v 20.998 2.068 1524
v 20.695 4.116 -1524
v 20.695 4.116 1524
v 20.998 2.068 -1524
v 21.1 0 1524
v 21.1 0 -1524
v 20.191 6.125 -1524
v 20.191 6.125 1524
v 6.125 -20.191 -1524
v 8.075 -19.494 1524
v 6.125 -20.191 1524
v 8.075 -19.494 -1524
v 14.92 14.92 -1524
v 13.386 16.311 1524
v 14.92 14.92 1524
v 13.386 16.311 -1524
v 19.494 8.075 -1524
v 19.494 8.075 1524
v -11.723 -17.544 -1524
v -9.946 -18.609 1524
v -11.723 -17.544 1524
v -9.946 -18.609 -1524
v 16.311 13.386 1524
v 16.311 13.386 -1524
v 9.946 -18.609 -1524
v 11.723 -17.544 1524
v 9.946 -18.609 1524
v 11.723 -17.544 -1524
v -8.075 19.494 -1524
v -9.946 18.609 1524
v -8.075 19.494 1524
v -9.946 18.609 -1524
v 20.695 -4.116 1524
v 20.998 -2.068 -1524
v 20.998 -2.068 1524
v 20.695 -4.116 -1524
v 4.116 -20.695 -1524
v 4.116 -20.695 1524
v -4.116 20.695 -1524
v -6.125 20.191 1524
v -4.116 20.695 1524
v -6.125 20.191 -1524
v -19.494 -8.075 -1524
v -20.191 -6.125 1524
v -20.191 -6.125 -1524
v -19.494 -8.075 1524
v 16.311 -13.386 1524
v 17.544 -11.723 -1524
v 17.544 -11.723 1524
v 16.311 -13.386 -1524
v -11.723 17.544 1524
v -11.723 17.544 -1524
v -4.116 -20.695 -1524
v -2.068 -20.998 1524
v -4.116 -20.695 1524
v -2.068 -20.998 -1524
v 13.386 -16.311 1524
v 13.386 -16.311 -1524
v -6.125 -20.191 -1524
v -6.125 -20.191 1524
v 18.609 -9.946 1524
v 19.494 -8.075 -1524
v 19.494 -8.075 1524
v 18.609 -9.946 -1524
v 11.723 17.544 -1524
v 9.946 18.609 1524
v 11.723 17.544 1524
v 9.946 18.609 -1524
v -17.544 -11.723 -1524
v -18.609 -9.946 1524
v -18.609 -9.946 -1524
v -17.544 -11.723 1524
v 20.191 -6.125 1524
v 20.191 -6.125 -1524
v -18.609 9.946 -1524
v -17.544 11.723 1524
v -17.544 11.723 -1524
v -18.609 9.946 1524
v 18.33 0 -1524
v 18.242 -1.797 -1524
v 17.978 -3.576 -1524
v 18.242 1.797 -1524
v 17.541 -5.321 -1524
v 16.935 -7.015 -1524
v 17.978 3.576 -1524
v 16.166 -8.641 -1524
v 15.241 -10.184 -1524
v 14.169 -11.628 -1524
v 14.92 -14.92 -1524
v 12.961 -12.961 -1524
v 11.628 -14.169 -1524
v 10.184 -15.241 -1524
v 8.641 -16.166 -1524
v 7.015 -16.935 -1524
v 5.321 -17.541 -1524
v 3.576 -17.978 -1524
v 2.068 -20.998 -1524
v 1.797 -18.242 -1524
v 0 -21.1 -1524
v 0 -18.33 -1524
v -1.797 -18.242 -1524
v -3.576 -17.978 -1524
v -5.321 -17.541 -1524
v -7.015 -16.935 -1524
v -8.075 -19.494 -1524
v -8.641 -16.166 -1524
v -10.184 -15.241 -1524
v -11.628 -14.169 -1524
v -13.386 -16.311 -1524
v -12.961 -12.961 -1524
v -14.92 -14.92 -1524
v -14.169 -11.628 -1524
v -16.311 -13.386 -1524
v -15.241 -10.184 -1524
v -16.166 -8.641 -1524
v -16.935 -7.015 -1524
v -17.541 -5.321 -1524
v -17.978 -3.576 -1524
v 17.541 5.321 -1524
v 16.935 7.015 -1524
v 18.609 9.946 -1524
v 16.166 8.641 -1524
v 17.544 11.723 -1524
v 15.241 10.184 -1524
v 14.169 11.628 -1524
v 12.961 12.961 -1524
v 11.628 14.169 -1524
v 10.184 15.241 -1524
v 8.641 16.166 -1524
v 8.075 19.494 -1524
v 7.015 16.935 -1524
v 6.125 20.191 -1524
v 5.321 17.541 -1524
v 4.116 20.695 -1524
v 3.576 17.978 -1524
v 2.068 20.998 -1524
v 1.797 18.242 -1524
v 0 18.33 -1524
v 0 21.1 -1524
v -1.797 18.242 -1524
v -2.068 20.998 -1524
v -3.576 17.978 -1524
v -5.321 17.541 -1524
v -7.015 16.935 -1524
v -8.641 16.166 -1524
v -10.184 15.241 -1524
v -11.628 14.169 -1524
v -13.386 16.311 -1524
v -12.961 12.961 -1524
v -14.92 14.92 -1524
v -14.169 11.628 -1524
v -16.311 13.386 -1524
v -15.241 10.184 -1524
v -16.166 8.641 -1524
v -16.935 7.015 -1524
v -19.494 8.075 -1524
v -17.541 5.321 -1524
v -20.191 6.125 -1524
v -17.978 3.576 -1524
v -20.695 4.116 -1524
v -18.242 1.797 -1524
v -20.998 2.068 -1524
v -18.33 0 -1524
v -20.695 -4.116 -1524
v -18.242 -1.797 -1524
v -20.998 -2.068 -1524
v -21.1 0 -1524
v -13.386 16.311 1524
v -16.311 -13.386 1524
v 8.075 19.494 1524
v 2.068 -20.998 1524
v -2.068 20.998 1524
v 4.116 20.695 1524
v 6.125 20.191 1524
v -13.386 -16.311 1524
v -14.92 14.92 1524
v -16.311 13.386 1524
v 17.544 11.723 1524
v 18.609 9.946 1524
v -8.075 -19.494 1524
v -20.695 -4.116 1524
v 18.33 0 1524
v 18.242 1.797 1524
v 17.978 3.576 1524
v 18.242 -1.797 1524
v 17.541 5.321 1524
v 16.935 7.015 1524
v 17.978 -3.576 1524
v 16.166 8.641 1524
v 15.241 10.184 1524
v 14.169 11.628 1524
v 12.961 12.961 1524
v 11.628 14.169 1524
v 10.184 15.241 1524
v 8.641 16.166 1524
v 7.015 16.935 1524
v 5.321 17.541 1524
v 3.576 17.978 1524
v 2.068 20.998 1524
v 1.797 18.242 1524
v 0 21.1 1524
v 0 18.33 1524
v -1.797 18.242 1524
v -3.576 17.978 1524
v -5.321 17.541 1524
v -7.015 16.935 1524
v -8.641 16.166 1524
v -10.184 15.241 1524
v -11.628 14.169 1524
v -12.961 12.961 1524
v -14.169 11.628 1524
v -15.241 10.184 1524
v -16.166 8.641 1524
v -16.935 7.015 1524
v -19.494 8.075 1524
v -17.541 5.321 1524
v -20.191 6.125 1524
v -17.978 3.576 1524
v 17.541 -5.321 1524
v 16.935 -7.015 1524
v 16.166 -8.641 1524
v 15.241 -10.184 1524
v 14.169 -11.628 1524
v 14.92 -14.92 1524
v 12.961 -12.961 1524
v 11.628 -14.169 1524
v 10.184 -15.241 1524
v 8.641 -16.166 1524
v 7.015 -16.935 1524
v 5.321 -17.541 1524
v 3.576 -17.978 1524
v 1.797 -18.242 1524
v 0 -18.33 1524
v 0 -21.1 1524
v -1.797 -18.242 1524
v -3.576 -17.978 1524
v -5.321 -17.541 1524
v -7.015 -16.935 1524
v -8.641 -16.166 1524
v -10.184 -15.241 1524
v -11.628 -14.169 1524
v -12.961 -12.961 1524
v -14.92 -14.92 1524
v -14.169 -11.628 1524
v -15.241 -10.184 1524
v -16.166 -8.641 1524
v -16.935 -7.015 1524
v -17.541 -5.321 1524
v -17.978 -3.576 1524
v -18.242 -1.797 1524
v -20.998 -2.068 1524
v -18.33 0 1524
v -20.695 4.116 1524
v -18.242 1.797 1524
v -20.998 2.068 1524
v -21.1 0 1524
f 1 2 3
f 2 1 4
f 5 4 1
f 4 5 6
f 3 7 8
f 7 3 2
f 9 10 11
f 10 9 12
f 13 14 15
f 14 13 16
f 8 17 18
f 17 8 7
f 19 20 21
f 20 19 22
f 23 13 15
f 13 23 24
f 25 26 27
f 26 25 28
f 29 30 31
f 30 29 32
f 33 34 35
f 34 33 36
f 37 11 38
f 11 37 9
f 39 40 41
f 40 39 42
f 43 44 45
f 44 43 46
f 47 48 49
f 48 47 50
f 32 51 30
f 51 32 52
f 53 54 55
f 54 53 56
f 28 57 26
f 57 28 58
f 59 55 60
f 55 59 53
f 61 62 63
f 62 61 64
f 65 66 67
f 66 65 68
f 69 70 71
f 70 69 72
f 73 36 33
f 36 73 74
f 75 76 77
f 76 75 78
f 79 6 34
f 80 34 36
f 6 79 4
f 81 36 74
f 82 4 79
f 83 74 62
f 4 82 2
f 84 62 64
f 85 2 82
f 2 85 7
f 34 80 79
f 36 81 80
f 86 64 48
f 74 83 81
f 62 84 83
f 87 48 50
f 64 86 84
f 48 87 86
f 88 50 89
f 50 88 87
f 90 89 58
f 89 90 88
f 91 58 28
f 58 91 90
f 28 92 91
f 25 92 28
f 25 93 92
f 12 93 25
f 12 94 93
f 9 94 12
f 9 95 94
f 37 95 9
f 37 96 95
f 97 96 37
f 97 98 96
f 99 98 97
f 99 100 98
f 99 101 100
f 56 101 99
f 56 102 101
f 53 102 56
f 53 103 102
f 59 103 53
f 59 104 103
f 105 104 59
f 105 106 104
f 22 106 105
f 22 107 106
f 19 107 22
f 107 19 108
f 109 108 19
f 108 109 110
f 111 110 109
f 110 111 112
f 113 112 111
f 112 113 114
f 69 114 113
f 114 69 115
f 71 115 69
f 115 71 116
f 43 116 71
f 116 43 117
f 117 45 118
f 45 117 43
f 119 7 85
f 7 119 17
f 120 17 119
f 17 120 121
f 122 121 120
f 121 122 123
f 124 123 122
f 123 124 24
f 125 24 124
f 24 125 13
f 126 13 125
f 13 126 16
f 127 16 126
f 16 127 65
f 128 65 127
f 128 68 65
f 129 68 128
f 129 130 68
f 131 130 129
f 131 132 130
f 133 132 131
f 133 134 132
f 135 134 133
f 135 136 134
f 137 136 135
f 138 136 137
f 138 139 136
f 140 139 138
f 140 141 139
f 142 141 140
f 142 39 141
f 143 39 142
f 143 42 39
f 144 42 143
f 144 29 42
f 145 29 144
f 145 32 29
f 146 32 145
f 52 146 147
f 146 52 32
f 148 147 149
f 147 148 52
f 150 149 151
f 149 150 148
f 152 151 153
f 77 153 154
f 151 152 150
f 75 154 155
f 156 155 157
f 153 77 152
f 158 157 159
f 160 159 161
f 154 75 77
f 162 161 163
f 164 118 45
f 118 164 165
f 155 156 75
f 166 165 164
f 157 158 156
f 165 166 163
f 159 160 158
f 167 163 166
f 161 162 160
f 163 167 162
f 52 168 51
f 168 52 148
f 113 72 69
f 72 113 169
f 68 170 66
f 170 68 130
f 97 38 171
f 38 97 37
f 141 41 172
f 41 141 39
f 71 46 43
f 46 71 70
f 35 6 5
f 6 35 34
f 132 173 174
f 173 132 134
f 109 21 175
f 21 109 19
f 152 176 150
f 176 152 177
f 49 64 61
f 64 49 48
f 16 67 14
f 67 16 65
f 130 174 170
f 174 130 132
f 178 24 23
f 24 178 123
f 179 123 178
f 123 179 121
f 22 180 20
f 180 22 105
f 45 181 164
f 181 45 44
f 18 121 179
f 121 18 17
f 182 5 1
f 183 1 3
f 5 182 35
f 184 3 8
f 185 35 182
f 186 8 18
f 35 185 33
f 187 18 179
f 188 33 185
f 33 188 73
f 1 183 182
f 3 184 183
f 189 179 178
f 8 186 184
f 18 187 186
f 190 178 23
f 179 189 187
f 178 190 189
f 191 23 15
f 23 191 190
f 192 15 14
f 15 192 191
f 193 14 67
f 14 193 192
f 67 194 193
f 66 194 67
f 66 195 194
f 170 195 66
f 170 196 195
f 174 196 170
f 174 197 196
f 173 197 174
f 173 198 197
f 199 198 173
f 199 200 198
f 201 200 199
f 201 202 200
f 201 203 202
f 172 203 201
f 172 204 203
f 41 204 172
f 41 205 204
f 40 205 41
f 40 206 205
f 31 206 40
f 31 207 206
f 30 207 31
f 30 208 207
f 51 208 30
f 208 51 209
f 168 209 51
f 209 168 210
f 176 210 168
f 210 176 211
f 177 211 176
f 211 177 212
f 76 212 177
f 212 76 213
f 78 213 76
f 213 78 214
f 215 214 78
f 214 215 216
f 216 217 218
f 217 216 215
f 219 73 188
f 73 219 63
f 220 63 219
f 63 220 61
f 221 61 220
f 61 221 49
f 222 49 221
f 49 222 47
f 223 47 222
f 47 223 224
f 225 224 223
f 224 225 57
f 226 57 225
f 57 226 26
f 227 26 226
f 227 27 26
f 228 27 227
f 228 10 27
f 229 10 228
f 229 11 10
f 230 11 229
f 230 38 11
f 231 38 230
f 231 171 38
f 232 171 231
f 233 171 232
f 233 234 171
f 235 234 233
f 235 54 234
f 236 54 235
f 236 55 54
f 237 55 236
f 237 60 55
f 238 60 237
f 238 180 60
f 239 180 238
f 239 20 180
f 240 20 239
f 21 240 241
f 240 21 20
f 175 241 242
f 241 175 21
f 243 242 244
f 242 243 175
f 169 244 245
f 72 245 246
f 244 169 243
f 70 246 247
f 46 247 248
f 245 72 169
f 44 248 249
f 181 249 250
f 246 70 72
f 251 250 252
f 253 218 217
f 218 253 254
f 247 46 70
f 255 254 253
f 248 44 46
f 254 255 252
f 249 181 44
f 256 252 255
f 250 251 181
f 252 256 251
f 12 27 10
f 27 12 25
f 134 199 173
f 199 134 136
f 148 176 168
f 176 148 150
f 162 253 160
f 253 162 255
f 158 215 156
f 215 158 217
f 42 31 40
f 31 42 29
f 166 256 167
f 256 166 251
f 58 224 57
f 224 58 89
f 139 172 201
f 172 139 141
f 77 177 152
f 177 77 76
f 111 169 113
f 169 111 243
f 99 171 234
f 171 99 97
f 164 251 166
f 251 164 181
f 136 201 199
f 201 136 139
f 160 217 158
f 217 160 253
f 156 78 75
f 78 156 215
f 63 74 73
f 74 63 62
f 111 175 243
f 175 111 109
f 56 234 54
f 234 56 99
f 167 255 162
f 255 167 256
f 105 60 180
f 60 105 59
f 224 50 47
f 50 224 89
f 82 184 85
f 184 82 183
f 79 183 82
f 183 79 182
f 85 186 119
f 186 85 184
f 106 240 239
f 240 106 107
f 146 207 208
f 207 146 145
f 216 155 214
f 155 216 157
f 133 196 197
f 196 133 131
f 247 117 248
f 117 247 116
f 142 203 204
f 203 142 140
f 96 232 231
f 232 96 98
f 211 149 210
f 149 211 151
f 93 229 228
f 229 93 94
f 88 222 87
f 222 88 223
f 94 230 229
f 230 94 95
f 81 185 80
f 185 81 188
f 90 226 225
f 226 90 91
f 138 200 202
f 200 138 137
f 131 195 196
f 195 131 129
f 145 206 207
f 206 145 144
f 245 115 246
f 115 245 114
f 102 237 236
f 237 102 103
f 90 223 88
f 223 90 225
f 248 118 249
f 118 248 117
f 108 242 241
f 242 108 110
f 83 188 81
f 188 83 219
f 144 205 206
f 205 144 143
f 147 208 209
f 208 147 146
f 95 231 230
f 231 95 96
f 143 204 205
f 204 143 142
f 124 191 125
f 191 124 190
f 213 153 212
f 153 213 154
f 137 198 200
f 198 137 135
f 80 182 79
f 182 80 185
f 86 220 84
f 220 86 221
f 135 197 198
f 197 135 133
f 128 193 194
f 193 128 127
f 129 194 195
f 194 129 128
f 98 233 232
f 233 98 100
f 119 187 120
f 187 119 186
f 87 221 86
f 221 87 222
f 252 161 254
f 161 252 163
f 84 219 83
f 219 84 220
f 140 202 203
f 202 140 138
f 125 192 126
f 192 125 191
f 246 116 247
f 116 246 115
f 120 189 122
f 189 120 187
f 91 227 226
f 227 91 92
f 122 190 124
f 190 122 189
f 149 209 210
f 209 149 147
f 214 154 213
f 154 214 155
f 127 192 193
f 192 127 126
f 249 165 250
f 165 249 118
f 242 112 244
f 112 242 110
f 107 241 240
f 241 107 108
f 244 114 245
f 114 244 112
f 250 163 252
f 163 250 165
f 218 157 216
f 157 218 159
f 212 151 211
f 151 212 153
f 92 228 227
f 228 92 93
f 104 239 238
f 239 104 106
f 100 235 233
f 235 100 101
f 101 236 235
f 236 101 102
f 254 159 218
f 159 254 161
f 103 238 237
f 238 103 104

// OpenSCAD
// Auto-generated by scripts/author_from_manifest.py (Phase D.3).
// Source: data/phase_d_manifest.json (sku_intent='blazemaster-cpvc-1_25in-10ft').
// Do not hand-edit — regenerate from the manifest.
//
// @part blazemaster_cpvc_1_25in_10ft
// @kind pipe_segment
// @category pipe.cpvc.blazemaster
// @display-name "Cpvc Blazemaster 1.25\" x 10ft"
// @mfg lubrizol_blazemaster
// @listing UL
// @price-usd 8.12
// @install-minutes 3
// @crew journeyman
// @param size_in number default=1.25 label="Size" unit="in"
// @port inlet position=[0,0,-0.5] direction=[0,0,-1] style=grooved size_in=1.25 role=run_a
// @port outlet position=[0,0,0.5] direction=[0,0,1] style=grooved size_in=1.25 role=run_b

size_in  = 1.25;
length_m = 3.0480;
schedule = "sch10";

function od_mm(nps) =
    nps ==  0.75 ? 26.7 :
    nps ==   1  ? 33.4 :
    nps == 1.25 ? 42.2 :
    nps == 1.5  ? 48.3 :
    nps ==   2  ? 60.3 :
    nps == 2.5  ? 73.0 :
    nps ==   3  ? 88.9 :
    nps ==   4  ? 114.3 :
    nps ==   5  ? 141.3 :
    nps ==   6  ? 168.3 :
    nps ==   8  ? 219.1 :
    nps ==  10  ? 273.0 : 60.3;

function wall_mm(nps, sched) =
    sched == "sch40"
        ? (nps <= 1.5 ? 3.68 : nps <= 3 ? 5.49 : 6.02)
        : (nps <= 1.5 ? 2.77 : nps <= 3 ? 3.05 : 3.68);

od = od_mm(size_in);
id = od - 2 * wall_mm(size_in, schedule);
len_mm = length_m * 1000;

difference() {
    cylinder(h = len_mm, d = od, center = true, $fn = 64);
    cylinder(h = len_mm + 1, d = id, center = true, $fn = 64);
}
